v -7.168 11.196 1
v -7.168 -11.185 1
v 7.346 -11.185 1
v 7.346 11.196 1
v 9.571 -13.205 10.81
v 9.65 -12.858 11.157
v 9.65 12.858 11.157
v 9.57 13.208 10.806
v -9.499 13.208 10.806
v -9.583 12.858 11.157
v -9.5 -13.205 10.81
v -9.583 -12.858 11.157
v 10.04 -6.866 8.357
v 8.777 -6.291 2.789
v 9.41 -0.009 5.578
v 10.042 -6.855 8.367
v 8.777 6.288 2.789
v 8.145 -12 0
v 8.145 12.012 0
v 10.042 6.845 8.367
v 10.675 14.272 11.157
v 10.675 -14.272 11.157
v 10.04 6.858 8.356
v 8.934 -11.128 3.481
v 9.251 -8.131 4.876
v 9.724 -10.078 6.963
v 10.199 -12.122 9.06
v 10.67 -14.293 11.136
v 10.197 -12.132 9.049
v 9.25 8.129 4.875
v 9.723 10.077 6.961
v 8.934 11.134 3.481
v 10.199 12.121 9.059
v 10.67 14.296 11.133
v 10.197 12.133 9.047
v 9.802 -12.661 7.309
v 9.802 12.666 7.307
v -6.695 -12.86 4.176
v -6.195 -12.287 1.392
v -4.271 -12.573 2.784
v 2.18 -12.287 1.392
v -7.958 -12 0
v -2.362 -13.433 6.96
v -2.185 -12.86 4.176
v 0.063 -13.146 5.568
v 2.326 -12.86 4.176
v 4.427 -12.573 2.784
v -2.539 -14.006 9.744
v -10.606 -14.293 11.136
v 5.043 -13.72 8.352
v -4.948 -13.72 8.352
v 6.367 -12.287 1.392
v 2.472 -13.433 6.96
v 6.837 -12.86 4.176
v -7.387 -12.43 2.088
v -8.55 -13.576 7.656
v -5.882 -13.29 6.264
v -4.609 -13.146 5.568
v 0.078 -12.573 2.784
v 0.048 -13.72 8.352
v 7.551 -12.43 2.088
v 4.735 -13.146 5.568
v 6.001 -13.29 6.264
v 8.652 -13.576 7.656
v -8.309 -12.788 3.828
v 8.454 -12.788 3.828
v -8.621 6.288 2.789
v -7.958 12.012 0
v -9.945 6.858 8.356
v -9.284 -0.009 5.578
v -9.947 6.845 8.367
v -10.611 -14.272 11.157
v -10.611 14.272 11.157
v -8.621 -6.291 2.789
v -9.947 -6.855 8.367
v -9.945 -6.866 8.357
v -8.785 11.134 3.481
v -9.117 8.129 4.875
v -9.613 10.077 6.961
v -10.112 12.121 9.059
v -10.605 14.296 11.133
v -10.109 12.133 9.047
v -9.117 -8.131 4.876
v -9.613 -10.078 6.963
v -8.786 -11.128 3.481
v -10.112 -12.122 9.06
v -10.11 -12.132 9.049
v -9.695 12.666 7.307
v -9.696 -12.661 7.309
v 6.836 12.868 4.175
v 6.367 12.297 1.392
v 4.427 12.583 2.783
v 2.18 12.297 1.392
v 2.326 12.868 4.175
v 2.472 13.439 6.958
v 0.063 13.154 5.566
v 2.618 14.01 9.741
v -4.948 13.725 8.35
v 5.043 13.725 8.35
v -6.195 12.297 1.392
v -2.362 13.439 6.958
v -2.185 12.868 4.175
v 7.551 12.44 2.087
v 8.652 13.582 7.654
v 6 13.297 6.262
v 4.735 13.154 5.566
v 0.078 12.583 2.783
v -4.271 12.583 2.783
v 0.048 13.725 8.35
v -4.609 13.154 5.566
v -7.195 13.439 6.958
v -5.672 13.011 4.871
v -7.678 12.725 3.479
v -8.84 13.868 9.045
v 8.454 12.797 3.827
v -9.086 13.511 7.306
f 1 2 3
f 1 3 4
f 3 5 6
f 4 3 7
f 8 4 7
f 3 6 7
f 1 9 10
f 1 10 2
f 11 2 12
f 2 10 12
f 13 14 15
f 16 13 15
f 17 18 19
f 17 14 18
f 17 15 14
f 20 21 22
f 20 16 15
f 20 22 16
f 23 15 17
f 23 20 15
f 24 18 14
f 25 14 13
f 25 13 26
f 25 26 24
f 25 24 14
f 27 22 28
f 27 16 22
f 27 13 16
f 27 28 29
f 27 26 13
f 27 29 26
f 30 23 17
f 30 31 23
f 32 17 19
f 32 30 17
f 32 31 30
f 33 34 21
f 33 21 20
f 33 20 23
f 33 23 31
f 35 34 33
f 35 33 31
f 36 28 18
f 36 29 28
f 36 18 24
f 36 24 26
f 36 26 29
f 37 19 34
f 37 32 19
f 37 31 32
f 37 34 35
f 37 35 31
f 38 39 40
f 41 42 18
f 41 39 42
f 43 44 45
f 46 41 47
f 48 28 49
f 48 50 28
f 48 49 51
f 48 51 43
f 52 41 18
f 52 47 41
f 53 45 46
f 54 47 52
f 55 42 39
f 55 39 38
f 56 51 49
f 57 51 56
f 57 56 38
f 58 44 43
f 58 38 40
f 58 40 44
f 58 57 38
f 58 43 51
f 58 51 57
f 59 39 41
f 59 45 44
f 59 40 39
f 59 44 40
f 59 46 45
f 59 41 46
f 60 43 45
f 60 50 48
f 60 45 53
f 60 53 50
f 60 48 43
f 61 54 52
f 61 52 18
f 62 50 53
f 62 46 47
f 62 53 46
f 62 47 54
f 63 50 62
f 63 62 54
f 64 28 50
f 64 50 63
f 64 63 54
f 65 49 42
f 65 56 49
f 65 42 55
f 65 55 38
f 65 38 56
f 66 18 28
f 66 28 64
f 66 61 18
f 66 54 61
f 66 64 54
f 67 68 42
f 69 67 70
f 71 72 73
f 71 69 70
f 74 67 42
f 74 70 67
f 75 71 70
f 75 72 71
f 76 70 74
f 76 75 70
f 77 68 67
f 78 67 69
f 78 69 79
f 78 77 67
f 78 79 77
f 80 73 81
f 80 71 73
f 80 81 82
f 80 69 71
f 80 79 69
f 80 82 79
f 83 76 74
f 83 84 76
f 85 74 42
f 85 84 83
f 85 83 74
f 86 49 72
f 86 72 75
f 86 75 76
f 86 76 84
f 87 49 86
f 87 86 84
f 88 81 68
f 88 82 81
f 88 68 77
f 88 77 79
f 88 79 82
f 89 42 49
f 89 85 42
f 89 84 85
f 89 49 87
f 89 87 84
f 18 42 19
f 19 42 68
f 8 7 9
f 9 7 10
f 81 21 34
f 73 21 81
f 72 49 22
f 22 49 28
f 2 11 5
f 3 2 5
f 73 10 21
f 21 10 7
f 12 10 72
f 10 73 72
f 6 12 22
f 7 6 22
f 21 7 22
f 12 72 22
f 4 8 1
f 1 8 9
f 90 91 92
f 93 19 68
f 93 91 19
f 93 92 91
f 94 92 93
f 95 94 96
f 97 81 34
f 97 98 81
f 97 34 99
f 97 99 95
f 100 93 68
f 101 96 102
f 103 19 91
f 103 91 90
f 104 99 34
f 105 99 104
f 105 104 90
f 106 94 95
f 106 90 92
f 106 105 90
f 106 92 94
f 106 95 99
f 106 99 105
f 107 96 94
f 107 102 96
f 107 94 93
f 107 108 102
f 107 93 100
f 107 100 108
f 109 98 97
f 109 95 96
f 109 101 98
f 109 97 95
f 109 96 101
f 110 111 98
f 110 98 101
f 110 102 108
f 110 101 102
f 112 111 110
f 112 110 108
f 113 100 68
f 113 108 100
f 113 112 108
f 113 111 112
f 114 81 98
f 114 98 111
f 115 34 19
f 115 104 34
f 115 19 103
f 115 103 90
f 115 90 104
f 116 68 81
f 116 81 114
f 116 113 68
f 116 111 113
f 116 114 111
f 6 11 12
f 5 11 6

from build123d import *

# Parameters (mm, degrees)
F0_W      = 16.1028504372
F0_H      = 24.0115216002
F2_W      = 24
F2_H      = 31
F5_W      = 14.02631565
F5_H      = 35.0832007825
F6_DEPTH  = 5
F8_W      = 36.7084983736
F8_H      = 15.6723505352
F9_DEPTH  = 5
F11_W     = 29.3105235323
F11_H     = 18.8404771034
F12_DEPTH = 5
F14_W     = 31.5226018429
F14_H     = 13.2806529291
F15_DEPTH = 5
F16_W     = 24.9057402834
F16_H     = 7.8468071297
F17_DEPTH = 25.4
F18_T     = -1


with BuildPart() as f3:
    # F0 (on Top) → F3 section 0
    with BuildSketch(Plane.XY):
        with Locations((0.0935448334, 0.0057467259)):
            Rectangle(F0_W, F0_H)
    # F2 (on offset) → F3 section 1
    with BuildSketch(Plane.XY.offset(17)):
        Rectangle(F2_W, F2_H)
    loft()

    # F5 (on face) → F6 (cut)
    with BuildSketch(Plane(origin=(-14.5, 0, 14.5), x_dir=(0.7071067812, 0, 0.7071067812), z_dir=(0.7071067812, 0, -0.7071067812))):
        with Locations((2.1269769641, -0.2655759454)):
            Rectangle(F5_W, F5_H)
    extrude(amount=F6_DEPTH, mode=Mode.SUBTRACT)

    # F8 (on face) → F9 (cut)
    with BuildSketch(Plane(origin=(14.5, 0, 14.5), x_dir=(0, 1, 0), z_dir=(0.7071067812, 0, 0.7071067812))):
        with Locations((-0.0566011295, 4.1208126349)):
            Rectangle(F8_W, F8_H)
    extrude(amount=-F9_DEPTH, mode=Mode.SUBTRACT)

    # F11 (on face) → F12 (cut)
    with BuildSketch(Plane(origin=(0, 16.25, 16.25), x_dir=(-1, 0, 0), z_dir=(0, 0.7071067812, 0.7071067812))):
        with Locations((0.3414950334, 3.7744397996)):
            Rectangle(F11_W, F11_H)
    extrude(amount=-F12_DEPTH, mode=Mode.SUBTRACT)

    # F14 (on face) → F15 (cut)
    with BuildSketch(Plane(origin=(0, -16.25, 16.25), x_dir=(1, 0, 0), z_dir=(0, 0.7071067812, -0.7071067812))):
        with Locations((0.8808970451, -0.6048630457)):
            Rectangle(F14_W, F14_H)
    extrude(amount=F15_DEPTH, mode=Mode.SUBTRACT)

    # F16 (on Front) → F17 (cut, symmetric)
    with BuildSketch(Plane.XZ):
        with Locations((-1.3808882795, 15.0799336843)):
            Rectangle(F16_W, F16_H)
    extrude(amount=F17_DEPTH, both=True, mode=Mode.SUBTRACT)

    # F18
    f18_openings = [f3.faces().sort_by_distance(p)[0] for p in [
        (0.032154, 0, 11.15653),
    ]]
    offset(amount=F18_T, openings=f18_openings)


solid = f3.part
